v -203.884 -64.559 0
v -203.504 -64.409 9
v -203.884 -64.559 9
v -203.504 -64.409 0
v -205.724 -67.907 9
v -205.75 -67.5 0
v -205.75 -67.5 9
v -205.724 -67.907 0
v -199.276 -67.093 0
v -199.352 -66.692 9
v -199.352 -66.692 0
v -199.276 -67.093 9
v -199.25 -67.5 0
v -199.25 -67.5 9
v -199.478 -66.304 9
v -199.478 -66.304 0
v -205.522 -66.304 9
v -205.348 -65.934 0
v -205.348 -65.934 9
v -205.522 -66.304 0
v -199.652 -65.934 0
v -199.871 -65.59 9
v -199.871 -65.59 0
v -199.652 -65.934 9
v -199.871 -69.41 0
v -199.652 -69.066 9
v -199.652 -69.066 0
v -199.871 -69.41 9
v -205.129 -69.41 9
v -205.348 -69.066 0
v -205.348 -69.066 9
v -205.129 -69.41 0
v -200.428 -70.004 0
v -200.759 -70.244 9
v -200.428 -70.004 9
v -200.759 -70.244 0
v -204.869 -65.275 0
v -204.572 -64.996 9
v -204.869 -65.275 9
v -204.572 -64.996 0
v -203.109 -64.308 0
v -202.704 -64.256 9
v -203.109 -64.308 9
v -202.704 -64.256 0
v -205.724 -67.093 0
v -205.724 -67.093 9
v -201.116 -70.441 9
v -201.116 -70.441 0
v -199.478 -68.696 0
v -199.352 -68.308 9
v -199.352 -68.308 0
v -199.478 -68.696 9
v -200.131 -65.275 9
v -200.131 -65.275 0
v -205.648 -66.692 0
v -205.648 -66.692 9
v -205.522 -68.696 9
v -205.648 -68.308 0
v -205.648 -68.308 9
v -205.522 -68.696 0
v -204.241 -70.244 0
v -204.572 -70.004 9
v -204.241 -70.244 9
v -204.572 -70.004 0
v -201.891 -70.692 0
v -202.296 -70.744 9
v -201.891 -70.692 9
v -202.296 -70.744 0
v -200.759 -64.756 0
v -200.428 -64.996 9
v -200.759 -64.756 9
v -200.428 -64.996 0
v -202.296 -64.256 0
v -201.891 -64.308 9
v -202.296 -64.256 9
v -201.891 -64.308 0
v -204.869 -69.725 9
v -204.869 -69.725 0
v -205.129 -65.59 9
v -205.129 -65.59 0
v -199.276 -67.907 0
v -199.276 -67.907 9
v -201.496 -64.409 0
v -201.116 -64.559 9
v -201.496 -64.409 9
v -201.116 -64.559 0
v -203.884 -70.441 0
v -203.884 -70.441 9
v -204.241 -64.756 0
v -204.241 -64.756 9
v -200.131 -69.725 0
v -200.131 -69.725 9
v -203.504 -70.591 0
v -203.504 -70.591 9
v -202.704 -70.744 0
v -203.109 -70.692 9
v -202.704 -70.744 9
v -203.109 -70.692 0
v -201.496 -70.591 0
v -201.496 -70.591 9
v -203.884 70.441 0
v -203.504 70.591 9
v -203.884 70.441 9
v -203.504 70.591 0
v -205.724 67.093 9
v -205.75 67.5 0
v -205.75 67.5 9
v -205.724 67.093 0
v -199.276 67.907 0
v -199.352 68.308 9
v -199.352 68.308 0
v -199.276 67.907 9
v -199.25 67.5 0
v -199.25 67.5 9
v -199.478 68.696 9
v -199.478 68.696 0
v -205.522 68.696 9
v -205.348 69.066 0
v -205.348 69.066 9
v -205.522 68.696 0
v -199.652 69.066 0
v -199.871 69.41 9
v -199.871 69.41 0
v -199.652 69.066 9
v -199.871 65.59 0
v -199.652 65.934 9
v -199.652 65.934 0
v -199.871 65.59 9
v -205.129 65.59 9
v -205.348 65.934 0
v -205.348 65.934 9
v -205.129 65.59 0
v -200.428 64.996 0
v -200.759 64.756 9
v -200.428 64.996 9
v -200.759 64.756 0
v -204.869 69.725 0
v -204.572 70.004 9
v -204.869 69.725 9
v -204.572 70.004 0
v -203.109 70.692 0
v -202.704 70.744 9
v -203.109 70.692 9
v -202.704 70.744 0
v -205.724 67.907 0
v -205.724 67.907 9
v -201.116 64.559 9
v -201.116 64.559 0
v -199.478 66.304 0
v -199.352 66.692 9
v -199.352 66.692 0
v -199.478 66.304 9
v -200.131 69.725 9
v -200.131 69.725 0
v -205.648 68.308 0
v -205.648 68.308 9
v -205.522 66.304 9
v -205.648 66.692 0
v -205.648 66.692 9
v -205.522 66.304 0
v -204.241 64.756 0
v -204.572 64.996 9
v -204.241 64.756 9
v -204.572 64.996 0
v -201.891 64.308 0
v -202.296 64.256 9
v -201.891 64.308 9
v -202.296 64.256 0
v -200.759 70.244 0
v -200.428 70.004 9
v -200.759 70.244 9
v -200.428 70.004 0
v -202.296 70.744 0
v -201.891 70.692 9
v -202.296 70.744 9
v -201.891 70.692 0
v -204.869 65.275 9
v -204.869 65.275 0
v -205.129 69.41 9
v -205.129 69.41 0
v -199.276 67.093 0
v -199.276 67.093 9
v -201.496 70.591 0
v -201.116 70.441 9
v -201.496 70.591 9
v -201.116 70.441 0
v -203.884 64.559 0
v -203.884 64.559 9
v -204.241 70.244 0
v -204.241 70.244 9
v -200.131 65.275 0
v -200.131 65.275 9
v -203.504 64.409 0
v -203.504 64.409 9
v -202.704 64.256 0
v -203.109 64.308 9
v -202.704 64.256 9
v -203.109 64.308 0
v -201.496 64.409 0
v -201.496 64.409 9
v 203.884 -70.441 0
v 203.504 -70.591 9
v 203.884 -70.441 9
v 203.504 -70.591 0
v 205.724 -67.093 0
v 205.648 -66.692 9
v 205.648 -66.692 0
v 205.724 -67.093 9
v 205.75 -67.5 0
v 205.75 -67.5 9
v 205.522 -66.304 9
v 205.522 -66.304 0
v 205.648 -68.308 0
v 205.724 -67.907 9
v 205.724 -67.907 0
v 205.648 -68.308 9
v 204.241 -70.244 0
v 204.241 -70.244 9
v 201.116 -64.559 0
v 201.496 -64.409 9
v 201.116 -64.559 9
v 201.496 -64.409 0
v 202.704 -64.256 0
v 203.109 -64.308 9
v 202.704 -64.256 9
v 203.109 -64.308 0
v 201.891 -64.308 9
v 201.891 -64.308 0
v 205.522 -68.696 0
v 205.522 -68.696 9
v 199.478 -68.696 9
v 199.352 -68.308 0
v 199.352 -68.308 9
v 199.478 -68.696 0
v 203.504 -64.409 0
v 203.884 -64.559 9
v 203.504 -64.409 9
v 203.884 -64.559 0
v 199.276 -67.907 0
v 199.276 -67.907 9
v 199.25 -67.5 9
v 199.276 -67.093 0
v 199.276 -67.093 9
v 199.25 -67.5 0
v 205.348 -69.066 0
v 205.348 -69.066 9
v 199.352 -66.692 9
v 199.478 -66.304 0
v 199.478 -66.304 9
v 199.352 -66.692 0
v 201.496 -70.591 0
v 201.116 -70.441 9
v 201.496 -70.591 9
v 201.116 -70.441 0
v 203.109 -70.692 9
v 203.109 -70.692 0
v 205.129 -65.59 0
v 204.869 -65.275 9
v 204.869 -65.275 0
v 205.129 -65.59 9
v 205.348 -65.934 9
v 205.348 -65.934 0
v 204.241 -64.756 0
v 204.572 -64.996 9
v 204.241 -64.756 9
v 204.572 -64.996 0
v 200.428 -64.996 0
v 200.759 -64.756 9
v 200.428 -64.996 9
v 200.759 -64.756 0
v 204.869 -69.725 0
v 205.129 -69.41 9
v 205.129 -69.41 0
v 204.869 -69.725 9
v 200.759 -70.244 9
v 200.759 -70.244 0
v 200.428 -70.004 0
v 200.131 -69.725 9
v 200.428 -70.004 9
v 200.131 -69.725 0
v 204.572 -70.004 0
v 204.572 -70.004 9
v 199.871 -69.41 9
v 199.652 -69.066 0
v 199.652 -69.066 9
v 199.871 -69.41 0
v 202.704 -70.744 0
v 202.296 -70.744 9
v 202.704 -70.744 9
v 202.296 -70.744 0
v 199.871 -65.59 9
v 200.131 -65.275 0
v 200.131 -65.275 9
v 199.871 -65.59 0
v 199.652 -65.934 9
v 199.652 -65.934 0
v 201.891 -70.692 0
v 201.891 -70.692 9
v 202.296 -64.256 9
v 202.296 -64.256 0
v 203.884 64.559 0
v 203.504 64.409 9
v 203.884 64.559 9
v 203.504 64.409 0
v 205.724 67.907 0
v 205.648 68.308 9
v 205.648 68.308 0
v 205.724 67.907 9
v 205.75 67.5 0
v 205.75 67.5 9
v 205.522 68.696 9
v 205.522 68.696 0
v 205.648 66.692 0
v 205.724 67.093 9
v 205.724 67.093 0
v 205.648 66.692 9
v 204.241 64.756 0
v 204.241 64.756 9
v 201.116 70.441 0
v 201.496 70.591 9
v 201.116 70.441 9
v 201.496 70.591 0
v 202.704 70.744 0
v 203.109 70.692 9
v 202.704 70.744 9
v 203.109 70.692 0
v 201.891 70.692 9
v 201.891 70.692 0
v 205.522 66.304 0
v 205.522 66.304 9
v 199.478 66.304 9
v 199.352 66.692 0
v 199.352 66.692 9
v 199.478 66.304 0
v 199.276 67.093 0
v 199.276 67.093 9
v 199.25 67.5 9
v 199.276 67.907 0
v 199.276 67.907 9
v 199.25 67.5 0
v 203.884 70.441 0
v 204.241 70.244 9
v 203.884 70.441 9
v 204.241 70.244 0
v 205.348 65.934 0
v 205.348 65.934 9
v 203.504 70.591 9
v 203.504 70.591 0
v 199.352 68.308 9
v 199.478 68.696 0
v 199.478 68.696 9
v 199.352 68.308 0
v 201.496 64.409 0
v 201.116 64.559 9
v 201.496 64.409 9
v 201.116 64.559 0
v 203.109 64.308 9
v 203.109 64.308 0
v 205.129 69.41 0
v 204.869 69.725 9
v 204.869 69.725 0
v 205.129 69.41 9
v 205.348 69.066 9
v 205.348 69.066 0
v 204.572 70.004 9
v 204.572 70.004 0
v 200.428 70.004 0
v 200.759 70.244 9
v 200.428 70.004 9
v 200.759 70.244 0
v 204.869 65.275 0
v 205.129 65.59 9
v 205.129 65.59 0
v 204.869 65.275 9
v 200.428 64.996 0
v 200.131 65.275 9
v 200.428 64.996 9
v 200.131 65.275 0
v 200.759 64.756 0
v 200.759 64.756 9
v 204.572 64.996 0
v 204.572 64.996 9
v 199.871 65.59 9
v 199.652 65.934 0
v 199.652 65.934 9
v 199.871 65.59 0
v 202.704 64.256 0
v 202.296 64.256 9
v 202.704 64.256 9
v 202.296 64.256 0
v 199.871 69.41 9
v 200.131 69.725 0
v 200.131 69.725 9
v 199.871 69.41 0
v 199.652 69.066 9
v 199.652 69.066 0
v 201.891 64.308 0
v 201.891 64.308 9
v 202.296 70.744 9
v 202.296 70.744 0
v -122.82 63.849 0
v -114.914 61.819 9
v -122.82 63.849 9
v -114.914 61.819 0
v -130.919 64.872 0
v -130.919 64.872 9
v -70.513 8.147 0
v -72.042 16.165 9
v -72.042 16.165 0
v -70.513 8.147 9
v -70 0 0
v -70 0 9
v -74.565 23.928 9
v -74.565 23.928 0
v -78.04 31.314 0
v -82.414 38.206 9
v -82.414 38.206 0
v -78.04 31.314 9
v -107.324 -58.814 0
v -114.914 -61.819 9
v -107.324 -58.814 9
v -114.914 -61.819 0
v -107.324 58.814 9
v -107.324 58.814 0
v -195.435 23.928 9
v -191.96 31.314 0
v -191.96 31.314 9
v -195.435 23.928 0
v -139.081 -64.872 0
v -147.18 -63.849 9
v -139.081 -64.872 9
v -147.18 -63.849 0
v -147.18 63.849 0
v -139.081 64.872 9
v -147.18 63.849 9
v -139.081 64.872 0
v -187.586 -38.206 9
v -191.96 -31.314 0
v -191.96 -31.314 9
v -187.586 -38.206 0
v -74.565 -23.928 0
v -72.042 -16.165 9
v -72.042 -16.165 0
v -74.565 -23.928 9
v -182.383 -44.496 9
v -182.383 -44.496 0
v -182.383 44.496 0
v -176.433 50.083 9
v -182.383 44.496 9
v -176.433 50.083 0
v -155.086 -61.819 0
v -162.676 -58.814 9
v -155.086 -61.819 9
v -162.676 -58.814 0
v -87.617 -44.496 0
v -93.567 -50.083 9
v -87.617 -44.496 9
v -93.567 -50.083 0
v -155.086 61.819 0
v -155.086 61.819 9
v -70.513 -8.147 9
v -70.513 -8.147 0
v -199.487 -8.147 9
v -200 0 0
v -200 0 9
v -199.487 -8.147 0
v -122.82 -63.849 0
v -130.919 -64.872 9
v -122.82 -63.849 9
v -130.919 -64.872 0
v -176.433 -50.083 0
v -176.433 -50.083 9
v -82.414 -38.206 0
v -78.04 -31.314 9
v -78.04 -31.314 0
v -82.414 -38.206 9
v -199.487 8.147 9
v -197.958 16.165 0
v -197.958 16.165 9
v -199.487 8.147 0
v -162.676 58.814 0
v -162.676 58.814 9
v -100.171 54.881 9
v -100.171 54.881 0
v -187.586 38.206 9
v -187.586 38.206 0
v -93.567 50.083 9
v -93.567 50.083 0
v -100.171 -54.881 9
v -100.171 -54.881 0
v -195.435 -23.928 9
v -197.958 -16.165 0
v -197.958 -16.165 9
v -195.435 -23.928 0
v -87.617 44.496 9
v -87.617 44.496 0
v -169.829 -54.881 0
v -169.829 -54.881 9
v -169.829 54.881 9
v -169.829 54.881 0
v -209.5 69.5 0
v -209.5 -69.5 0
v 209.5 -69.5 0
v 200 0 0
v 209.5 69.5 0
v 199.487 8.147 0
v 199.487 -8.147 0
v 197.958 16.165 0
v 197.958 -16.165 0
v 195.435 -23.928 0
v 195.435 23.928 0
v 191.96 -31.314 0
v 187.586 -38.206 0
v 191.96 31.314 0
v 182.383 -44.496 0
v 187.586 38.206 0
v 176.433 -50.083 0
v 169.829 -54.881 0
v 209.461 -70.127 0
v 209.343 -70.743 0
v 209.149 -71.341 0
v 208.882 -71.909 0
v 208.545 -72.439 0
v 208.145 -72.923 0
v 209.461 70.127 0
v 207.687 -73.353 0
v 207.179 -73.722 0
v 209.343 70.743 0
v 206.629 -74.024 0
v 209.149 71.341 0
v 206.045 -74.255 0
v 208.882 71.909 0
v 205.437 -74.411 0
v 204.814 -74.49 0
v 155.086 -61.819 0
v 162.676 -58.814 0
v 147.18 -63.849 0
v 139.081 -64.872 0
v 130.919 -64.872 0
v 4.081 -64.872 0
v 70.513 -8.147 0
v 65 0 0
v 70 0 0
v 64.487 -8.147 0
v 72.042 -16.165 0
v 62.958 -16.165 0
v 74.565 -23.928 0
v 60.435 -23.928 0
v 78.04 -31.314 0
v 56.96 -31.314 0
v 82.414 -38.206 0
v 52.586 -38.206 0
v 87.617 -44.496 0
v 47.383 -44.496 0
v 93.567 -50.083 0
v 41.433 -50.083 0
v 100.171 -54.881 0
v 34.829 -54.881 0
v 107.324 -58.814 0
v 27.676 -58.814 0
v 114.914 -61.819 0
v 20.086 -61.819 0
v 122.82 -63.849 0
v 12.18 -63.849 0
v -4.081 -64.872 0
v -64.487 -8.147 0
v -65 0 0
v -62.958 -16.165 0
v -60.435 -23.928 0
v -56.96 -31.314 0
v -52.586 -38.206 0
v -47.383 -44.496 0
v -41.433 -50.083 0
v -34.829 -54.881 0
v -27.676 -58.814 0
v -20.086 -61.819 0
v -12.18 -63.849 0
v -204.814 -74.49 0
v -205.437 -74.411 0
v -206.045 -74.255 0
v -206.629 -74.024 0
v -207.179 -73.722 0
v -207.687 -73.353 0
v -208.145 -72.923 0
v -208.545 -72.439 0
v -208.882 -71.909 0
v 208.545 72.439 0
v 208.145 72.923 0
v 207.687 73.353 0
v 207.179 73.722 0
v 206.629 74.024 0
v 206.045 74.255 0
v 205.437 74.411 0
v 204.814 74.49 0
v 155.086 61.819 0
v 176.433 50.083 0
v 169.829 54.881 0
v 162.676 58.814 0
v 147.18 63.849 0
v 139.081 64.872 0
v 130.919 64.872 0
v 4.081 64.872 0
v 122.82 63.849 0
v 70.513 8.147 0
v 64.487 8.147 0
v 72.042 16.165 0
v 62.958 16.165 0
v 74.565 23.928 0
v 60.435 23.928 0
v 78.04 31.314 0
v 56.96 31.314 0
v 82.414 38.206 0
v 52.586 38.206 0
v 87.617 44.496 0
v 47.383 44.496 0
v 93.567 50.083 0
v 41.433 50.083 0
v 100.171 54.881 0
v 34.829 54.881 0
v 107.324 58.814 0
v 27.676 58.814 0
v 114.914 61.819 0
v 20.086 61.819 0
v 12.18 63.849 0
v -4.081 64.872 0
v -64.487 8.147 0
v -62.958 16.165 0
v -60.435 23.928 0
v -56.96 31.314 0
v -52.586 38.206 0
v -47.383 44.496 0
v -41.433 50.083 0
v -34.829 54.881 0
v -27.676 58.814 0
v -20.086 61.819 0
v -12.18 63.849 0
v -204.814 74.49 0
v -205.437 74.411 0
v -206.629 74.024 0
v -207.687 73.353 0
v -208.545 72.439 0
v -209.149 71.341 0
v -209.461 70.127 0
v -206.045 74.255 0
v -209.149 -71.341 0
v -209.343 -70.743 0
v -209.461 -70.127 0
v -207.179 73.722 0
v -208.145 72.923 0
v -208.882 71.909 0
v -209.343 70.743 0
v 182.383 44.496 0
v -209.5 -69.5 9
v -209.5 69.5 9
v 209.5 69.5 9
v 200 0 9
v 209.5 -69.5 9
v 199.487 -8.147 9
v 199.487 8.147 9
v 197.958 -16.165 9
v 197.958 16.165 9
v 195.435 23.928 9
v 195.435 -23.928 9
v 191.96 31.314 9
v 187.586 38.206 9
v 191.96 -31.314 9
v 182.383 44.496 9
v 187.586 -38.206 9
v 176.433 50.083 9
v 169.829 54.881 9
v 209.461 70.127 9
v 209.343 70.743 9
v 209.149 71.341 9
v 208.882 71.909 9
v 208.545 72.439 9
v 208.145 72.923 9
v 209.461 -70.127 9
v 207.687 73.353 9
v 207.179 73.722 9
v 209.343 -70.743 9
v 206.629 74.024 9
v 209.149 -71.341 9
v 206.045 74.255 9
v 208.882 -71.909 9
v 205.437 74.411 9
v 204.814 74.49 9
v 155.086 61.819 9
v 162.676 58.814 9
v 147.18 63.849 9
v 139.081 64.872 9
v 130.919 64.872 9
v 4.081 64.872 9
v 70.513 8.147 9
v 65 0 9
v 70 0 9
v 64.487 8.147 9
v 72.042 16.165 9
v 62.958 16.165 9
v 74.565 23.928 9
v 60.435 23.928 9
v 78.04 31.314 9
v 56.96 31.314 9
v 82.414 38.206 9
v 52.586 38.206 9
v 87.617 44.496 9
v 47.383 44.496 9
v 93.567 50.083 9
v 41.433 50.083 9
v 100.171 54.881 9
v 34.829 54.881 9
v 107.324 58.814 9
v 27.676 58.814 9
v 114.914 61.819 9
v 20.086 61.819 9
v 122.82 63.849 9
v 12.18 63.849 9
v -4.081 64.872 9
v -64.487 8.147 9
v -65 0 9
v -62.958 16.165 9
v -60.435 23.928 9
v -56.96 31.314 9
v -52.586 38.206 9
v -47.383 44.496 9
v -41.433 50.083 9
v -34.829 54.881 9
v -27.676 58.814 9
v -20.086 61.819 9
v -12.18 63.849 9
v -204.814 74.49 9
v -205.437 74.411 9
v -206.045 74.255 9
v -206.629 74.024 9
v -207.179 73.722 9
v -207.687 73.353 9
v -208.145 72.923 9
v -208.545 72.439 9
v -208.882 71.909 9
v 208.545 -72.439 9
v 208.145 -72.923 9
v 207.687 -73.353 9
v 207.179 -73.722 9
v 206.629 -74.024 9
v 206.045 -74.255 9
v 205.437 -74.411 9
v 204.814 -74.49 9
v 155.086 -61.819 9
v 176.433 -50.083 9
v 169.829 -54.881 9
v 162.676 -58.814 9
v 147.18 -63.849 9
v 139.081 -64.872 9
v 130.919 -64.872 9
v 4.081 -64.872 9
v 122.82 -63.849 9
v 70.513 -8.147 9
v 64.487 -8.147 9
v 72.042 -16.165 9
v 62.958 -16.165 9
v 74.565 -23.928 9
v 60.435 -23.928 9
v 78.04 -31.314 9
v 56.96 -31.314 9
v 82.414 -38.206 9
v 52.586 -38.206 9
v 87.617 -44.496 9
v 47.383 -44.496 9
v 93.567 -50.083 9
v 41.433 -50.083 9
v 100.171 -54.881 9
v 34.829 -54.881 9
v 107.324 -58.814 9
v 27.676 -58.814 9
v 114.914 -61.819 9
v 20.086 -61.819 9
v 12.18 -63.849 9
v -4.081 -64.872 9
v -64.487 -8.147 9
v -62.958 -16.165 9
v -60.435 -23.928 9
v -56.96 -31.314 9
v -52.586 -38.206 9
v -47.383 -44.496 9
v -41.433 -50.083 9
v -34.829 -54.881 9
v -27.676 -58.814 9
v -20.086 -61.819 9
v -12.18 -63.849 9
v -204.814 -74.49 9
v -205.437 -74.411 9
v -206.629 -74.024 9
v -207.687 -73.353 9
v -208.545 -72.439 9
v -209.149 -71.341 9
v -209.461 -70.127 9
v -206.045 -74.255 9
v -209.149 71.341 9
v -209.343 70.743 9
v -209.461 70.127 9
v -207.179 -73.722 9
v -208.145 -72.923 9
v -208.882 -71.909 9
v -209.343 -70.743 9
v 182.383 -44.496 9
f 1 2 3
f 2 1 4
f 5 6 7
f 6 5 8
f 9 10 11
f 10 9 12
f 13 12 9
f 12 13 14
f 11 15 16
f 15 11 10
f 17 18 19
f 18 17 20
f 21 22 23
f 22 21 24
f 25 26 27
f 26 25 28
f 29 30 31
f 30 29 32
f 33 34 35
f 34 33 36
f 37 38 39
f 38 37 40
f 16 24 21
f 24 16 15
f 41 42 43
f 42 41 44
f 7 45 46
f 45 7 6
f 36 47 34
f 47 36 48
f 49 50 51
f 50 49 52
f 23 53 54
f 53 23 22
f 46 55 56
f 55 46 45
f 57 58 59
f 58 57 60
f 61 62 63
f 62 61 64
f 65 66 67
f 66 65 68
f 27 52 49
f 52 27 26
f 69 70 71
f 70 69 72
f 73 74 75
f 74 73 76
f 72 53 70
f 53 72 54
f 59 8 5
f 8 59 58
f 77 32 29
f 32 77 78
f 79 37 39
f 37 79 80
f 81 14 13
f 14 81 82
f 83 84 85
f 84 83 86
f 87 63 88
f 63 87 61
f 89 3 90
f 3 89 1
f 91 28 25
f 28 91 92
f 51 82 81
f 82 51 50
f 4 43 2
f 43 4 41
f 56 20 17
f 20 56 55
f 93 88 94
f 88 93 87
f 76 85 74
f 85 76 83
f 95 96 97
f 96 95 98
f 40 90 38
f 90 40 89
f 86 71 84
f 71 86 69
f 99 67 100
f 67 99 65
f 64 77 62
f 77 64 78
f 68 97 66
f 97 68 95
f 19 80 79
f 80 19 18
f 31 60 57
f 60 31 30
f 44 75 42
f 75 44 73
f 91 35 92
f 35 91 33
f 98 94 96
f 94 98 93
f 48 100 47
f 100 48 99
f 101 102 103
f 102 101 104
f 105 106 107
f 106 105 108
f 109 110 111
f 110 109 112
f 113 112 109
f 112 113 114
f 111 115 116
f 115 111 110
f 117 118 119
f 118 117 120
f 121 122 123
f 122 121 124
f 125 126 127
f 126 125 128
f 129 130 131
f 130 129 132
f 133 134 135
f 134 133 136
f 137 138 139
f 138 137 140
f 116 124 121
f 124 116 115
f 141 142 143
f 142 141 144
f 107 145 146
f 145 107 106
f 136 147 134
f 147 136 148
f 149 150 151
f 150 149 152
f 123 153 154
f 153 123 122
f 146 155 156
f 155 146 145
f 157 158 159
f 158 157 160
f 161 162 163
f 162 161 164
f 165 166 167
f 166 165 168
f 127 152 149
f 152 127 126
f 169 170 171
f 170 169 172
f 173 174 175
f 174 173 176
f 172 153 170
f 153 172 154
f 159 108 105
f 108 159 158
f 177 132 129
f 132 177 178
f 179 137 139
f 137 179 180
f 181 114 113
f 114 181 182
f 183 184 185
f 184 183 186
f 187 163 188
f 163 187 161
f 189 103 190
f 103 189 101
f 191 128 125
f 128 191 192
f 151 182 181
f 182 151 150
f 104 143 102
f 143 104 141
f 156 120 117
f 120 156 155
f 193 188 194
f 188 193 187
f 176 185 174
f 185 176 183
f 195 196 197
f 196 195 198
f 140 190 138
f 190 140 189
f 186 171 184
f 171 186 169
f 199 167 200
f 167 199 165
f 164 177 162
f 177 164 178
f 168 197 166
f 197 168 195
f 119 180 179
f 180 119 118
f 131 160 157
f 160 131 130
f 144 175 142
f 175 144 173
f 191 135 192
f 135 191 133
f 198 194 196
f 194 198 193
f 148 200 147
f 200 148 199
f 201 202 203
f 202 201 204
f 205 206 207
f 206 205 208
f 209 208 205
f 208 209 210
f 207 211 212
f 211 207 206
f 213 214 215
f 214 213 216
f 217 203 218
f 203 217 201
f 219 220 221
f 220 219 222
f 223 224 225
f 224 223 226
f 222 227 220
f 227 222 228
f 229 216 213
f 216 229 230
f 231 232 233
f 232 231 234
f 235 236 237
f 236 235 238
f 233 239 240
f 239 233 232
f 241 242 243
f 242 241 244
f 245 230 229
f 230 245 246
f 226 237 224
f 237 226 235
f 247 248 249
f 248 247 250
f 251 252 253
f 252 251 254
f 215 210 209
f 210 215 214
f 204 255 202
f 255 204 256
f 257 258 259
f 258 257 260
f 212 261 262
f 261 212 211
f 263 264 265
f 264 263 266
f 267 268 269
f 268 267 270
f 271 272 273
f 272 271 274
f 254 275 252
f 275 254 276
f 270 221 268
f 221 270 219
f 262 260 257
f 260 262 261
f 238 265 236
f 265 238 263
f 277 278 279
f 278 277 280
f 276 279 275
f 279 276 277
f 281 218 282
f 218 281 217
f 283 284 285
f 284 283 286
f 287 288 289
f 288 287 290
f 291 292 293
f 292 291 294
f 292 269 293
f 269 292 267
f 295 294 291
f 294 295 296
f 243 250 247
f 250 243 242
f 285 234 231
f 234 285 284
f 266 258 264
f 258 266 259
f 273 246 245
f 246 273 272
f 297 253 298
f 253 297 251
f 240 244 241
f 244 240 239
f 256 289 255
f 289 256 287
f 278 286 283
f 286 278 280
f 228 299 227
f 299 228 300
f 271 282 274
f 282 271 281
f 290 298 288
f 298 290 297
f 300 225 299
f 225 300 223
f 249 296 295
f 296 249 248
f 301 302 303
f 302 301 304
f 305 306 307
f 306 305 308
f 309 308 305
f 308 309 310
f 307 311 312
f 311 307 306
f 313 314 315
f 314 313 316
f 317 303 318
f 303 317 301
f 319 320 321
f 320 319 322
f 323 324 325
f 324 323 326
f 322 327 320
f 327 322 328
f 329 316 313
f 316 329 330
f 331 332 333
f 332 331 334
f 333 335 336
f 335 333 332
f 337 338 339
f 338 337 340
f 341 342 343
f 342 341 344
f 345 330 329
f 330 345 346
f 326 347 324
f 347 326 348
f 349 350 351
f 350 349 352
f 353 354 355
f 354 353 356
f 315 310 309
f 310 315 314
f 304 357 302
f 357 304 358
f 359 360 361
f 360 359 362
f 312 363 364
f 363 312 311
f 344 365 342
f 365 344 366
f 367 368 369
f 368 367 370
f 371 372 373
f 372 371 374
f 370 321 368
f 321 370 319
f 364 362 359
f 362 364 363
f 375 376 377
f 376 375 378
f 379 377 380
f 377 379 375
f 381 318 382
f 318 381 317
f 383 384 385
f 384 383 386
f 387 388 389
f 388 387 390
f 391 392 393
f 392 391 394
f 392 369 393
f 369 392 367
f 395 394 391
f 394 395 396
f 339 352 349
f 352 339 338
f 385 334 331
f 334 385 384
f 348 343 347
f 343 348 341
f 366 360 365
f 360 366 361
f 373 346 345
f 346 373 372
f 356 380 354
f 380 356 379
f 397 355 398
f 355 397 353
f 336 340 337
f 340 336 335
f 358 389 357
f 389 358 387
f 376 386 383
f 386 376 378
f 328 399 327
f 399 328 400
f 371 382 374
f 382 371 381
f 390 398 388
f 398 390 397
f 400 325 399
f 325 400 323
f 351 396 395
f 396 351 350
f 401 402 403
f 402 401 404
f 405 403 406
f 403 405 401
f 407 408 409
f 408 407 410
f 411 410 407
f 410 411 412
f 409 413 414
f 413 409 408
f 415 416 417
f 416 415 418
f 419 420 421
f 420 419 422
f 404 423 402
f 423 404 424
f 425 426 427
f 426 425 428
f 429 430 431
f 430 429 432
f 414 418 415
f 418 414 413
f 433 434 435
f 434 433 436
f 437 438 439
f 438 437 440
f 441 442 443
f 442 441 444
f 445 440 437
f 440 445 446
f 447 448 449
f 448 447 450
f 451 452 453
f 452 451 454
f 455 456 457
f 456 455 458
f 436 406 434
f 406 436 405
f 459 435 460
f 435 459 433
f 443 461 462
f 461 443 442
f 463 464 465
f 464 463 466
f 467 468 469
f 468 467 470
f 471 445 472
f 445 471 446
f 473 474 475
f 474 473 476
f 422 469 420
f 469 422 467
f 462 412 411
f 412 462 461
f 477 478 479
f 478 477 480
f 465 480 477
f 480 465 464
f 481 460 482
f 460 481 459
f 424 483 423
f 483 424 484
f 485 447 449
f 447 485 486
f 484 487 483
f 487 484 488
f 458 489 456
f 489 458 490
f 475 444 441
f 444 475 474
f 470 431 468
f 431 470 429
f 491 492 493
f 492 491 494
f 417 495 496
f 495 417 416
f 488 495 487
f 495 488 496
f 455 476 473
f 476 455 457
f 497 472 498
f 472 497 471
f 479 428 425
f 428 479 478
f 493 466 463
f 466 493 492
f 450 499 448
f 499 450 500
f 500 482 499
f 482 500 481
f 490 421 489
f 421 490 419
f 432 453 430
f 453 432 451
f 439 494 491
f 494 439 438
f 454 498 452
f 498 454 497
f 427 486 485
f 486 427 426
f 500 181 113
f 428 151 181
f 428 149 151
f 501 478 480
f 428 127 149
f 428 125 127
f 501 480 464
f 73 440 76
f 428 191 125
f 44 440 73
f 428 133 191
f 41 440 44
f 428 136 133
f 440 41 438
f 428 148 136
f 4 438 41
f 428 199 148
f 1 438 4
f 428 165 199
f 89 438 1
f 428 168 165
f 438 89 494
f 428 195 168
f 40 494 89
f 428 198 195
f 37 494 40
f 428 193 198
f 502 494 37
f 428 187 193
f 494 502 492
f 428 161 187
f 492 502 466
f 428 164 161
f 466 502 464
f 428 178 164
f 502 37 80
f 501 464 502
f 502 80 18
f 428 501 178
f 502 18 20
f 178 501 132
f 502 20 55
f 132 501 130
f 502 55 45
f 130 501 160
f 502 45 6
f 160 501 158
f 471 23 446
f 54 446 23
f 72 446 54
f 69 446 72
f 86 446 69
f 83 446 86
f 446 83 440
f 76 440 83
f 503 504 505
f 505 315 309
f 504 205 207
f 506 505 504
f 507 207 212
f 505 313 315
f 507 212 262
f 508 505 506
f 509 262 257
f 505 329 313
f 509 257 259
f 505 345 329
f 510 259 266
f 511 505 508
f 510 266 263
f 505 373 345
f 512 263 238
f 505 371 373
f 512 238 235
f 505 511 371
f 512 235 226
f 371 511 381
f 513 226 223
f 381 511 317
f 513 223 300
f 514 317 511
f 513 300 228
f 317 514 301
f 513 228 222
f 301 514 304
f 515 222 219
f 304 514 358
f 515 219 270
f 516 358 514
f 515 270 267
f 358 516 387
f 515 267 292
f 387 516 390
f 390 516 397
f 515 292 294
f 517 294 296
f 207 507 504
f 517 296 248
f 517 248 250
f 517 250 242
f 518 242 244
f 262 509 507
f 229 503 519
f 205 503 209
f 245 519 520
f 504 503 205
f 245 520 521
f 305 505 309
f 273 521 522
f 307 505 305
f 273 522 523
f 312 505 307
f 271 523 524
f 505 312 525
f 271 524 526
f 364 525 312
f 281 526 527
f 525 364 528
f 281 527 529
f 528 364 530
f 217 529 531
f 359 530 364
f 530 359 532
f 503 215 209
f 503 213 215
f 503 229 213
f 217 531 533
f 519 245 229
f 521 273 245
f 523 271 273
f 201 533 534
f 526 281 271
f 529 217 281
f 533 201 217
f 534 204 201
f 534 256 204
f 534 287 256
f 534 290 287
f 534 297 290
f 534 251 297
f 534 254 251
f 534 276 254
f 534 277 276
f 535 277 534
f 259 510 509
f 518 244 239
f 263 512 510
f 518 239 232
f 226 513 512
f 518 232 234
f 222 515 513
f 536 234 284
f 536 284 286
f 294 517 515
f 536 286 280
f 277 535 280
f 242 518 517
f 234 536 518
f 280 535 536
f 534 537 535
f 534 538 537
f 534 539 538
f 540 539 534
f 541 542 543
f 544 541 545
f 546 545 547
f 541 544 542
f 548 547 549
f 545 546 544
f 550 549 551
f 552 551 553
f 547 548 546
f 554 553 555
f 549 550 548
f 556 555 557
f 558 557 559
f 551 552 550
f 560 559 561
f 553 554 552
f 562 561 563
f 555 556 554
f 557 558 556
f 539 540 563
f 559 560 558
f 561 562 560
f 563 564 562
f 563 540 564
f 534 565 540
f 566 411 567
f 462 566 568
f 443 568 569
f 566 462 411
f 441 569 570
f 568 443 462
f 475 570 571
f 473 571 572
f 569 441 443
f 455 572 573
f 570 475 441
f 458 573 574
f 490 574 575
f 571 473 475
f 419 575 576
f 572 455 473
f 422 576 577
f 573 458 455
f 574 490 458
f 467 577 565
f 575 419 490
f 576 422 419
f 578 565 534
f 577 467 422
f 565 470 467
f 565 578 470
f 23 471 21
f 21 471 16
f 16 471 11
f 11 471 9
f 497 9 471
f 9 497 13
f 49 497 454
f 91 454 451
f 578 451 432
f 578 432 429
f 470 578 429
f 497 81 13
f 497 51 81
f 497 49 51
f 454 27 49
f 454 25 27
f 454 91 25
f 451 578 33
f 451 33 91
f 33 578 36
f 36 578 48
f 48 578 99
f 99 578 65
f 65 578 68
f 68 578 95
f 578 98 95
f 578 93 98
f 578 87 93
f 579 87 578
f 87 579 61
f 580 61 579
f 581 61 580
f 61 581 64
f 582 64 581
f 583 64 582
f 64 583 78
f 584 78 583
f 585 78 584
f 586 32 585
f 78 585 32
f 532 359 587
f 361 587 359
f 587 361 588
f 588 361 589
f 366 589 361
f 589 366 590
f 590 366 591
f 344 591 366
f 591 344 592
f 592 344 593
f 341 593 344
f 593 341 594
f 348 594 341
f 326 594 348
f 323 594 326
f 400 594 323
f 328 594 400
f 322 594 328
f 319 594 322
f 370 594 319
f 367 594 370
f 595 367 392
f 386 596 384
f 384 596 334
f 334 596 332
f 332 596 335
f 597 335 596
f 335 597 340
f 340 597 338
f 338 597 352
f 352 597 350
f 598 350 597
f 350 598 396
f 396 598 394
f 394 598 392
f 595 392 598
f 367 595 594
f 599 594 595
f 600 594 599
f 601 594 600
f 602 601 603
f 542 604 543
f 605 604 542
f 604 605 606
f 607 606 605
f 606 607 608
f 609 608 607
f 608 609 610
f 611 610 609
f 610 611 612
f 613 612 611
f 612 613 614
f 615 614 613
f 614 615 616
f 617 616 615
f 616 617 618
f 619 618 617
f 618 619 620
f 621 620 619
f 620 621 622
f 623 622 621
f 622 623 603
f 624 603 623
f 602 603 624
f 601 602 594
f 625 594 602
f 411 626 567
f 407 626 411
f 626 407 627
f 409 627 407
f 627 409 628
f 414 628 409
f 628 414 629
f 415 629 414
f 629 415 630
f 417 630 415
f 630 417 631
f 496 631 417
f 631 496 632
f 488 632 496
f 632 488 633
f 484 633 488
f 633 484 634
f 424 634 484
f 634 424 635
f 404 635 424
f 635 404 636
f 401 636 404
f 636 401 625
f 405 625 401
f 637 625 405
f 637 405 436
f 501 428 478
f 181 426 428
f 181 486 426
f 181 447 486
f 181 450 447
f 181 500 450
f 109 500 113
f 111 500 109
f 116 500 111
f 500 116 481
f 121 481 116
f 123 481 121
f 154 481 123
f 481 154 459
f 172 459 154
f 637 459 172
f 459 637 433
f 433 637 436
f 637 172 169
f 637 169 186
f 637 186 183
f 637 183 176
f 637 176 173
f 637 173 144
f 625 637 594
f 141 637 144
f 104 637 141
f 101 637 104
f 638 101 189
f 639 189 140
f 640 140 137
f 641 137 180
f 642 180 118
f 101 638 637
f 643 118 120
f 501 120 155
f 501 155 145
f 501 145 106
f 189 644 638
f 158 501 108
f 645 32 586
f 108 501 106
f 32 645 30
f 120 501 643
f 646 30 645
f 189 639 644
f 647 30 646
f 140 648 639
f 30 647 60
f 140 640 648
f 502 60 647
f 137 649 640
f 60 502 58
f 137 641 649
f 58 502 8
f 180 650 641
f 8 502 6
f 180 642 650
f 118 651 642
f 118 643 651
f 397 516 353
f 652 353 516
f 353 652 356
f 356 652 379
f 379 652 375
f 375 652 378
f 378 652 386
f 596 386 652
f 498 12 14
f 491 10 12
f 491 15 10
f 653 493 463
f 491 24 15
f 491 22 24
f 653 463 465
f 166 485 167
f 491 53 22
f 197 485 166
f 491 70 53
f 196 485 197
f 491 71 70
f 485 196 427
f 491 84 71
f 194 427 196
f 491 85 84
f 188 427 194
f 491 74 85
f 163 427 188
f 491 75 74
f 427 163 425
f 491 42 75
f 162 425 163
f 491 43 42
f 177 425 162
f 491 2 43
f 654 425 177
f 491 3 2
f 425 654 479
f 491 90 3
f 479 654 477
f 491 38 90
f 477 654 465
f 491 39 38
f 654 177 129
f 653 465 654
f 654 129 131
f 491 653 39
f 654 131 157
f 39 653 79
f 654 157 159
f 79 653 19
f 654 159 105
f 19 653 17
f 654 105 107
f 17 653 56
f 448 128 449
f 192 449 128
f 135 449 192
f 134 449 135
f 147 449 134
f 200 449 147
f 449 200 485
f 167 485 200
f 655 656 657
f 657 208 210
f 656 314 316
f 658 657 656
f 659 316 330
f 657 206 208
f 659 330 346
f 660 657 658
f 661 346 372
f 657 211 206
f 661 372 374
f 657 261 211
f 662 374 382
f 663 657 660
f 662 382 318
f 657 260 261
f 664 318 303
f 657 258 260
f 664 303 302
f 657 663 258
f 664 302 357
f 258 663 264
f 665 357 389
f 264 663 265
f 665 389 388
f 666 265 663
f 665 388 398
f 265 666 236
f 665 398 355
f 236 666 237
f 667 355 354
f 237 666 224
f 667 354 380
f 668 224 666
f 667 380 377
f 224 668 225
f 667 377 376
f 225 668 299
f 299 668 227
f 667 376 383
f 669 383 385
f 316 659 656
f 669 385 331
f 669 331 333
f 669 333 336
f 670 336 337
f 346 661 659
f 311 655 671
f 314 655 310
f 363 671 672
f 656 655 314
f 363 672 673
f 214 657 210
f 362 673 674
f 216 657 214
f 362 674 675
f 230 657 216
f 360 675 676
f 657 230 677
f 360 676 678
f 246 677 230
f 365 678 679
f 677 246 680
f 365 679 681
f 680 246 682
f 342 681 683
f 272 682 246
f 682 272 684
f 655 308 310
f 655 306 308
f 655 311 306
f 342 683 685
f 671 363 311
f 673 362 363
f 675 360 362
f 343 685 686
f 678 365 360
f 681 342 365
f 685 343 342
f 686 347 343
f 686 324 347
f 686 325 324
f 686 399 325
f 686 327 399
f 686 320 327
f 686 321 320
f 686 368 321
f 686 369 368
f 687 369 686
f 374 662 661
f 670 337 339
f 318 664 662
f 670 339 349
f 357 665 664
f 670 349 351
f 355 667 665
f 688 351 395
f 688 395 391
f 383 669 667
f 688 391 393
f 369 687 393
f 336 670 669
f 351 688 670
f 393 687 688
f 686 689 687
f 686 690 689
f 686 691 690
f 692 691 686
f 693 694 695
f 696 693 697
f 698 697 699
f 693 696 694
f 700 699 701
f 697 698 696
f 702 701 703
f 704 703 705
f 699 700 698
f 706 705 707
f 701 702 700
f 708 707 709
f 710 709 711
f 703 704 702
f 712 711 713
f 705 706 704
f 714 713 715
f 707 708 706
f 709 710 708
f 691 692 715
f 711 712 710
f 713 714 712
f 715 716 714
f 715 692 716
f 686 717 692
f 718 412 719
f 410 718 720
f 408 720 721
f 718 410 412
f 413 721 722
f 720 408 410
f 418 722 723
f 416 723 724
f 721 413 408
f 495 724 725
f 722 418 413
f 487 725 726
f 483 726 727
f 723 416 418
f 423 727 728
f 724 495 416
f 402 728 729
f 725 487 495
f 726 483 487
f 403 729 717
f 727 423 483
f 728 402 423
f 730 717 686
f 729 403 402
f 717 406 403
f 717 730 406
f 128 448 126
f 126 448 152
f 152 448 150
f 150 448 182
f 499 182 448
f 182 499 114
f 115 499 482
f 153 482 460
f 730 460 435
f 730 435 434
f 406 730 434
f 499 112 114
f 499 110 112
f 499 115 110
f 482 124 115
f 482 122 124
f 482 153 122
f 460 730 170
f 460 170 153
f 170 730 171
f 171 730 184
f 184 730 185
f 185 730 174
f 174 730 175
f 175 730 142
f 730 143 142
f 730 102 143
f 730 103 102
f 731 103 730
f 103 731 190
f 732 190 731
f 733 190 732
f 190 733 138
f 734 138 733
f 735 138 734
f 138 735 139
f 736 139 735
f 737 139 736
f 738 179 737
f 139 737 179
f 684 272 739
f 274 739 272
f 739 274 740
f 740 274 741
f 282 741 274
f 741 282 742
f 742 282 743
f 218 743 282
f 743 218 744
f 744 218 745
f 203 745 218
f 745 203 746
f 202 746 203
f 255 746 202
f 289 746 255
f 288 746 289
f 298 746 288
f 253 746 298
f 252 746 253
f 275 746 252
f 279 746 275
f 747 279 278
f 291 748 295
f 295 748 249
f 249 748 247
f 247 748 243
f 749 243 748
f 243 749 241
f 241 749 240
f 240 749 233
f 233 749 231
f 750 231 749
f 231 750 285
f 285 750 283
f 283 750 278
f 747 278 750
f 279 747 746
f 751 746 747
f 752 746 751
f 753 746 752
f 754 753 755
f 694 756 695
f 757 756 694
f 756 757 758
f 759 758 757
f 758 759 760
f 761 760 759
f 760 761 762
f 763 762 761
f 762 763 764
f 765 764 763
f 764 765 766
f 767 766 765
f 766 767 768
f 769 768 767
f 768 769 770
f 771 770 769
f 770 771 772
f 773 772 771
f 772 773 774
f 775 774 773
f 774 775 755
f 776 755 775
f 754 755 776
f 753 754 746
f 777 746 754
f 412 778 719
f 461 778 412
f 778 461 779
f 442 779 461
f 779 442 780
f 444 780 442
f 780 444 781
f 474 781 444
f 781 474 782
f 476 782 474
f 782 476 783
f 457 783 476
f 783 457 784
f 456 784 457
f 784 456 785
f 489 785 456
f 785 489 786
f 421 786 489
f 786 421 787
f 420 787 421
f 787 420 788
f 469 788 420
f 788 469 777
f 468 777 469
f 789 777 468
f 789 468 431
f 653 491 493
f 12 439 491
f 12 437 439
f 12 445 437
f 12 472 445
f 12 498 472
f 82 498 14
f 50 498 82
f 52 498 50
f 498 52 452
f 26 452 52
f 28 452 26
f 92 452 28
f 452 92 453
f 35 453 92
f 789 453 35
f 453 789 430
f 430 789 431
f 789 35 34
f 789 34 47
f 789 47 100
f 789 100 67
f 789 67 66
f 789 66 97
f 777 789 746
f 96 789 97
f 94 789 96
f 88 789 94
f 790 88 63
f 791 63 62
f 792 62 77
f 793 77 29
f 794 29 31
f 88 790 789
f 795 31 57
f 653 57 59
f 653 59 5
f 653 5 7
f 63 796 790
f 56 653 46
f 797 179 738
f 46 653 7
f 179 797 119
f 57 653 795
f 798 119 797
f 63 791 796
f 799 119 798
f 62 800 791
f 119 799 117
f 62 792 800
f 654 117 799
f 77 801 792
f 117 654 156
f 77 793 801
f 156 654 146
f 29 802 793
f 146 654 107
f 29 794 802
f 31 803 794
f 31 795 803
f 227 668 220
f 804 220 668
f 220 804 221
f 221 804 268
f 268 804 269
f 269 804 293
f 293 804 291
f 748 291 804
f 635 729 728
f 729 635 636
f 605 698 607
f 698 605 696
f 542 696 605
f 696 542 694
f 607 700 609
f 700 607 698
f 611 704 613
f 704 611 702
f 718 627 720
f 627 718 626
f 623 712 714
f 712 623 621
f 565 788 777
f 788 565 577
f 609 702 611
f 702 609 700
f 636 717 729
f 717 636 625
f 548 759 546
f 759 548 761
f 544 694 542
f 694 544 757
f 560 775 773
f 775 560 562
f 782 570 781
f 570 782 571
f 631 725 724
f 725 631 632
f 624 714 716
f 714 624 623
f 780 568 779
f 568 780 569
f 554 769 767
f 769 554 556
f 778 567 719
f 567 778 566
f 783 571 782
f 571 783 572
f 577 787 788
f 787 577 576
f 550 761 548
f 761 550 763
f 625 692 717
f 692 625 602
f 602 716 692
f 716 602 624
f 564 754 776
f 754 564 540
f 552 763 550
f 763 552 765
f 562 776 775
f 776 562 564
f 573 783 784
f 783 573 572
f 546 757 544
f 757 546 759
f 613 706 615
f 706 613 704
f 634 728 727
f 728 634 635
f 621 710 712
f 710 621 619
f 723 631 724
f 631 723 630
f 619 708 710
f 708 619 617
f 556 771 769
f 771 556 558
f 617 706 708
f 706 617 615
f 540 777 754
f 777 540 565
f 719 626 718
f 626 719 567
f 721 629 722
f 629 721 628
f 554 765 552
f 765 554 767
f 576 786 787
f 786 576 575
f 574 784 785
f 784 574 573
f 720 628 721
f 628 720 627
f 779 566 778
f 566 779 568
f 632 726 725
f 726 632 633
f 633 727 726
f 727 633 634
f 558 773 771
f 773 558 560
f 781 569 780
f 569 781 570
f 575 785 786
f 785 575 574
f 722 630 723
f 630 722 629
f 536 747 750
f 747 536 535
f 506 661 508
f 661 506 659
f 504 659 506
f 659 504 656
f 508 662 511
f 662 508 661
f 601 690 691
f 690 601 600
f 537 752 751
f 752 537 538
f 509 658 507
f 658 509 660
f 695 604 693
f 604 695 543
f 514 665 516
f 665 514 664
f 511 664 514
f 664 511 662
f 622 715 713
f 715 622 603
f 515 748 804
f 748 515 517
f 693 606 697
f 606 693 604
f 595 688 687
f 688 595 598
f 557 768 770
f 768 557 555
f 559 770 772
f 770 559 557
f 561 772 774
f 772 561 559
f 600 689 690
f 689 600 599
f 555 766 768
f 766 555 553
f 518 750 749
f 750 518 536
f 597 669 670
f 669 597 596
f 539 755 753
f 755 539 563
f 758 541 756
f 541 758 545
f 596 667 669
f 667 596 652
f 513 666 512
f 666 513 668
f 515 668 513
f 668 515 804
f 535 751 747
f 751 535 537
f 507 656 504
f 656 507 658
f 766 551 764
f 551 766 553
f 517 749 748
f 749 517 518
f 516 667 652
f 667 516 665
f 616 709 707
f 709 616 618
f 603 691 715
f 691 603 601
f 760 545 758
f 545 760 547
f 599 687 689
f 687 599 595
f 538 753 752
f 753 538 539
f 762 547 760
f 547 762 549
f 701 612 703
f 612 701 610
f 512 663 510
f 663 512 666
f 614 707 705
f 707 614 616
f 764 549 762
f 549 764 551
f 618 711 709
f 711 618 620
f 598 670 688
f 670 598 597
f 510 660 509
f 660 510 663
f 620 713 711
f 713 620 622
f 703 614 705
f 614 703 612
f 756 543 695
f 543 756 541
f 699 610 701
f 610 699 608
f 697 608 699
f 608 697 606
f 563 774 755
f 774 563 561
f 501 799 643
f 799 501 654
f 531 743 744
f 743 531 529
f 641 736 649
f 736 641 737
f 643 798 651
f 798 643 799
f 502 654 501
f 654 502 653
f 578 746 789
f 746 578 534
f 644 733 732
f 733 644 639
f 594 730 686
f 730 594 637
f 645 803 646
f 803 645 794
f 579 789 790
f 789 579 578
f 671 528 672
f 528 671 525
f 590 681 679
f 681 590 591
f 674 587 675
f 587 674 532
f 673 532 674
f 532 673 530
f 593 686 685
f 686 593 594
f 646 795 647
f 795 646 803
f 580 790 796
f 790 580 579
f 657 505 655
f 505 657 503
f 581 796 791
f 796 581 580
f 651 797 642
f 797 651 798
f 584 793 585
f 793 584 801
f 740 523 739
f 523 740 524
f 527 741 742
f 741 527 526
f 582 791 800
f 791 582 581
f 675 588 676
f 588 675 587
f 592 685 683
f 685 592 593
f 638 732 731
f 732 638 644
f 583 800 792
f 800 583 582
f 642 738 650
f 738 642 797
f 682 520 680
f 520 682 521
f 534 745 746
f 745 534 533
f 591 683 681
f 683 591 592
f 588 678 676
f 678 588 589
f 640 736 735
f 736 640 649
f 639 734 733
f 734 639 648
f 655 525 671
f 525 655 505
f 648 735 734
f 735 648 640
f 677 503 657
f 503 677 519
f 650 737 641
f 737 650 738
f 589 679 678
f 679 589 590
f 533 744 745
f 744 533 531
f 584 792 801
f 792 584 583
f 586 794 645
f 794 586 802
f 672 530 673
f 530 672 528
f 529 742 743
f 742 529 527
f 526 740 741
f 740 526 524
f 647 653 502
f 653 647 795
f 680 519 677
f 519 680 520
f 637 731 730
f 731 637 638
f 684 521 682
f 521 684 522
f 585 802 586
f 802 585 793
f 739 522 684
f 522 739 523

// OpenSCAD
$fn = 50;

difference() {
	union() {
		hull() {
			translate(v = [-204.5, 69.5, 0]) {
				cylinder(h = 9, r = 5);
			}
			translate(v = [204.5, 69.5, 0]) {
				cylinder(h = 9, r = 5);
			}
			translate(v = [-204.5, -69.5, 0]) {
				cylinder(h = 9, r = 5);
			}
			translate(v = [204.5, -69.5, 0]) {
				cylinder(h = 9, r = 5);
			}
		}
	}
	union() {
		translate(v = [-202.5, -67.5, -100.0]) {
			cylinder(h = 200, r = 3.25);
		}
		translate(v = [-202.5, 67.5, -100.0]) {
			cylinder(h = 200, r = 3.25);
		}
		translate(v = [202.5, -67.5, -100.0]) {
			cylinder(h = 200, r = 3.25);
		}
		translate(v = [202.5, 67.5, -100.0]) {
			cylinder(h = 200, r = 3.25);
		}
		translate(v = [-202.5, -67.5, -100.0]) {
			cylinder(h = 200, r = 1.8);
		}
		translate(v = [-202.5, 67.5, -100.0]) {
			cylinder(h = 200, r = 1.8);
		}
		translate(v = [202.5, -67.5, -100.0]) {
			cylinder(h = 200, r = 1.8);
		}
		translate(v = [202.5, 67.5, -100.0]) {
			cylinder(h = 200, r = 1.8);
		}
		translate(v = [-135.0, 0, 0.0]) {
			cylinder(h = 9, r = 65.0);
		}
		cylinder(h = 9, r = 65.0);
		translate(v = [135.0, 0, 0.0]) {
			cylinder(h = 9, r = 65.0);
		}
	}
}
